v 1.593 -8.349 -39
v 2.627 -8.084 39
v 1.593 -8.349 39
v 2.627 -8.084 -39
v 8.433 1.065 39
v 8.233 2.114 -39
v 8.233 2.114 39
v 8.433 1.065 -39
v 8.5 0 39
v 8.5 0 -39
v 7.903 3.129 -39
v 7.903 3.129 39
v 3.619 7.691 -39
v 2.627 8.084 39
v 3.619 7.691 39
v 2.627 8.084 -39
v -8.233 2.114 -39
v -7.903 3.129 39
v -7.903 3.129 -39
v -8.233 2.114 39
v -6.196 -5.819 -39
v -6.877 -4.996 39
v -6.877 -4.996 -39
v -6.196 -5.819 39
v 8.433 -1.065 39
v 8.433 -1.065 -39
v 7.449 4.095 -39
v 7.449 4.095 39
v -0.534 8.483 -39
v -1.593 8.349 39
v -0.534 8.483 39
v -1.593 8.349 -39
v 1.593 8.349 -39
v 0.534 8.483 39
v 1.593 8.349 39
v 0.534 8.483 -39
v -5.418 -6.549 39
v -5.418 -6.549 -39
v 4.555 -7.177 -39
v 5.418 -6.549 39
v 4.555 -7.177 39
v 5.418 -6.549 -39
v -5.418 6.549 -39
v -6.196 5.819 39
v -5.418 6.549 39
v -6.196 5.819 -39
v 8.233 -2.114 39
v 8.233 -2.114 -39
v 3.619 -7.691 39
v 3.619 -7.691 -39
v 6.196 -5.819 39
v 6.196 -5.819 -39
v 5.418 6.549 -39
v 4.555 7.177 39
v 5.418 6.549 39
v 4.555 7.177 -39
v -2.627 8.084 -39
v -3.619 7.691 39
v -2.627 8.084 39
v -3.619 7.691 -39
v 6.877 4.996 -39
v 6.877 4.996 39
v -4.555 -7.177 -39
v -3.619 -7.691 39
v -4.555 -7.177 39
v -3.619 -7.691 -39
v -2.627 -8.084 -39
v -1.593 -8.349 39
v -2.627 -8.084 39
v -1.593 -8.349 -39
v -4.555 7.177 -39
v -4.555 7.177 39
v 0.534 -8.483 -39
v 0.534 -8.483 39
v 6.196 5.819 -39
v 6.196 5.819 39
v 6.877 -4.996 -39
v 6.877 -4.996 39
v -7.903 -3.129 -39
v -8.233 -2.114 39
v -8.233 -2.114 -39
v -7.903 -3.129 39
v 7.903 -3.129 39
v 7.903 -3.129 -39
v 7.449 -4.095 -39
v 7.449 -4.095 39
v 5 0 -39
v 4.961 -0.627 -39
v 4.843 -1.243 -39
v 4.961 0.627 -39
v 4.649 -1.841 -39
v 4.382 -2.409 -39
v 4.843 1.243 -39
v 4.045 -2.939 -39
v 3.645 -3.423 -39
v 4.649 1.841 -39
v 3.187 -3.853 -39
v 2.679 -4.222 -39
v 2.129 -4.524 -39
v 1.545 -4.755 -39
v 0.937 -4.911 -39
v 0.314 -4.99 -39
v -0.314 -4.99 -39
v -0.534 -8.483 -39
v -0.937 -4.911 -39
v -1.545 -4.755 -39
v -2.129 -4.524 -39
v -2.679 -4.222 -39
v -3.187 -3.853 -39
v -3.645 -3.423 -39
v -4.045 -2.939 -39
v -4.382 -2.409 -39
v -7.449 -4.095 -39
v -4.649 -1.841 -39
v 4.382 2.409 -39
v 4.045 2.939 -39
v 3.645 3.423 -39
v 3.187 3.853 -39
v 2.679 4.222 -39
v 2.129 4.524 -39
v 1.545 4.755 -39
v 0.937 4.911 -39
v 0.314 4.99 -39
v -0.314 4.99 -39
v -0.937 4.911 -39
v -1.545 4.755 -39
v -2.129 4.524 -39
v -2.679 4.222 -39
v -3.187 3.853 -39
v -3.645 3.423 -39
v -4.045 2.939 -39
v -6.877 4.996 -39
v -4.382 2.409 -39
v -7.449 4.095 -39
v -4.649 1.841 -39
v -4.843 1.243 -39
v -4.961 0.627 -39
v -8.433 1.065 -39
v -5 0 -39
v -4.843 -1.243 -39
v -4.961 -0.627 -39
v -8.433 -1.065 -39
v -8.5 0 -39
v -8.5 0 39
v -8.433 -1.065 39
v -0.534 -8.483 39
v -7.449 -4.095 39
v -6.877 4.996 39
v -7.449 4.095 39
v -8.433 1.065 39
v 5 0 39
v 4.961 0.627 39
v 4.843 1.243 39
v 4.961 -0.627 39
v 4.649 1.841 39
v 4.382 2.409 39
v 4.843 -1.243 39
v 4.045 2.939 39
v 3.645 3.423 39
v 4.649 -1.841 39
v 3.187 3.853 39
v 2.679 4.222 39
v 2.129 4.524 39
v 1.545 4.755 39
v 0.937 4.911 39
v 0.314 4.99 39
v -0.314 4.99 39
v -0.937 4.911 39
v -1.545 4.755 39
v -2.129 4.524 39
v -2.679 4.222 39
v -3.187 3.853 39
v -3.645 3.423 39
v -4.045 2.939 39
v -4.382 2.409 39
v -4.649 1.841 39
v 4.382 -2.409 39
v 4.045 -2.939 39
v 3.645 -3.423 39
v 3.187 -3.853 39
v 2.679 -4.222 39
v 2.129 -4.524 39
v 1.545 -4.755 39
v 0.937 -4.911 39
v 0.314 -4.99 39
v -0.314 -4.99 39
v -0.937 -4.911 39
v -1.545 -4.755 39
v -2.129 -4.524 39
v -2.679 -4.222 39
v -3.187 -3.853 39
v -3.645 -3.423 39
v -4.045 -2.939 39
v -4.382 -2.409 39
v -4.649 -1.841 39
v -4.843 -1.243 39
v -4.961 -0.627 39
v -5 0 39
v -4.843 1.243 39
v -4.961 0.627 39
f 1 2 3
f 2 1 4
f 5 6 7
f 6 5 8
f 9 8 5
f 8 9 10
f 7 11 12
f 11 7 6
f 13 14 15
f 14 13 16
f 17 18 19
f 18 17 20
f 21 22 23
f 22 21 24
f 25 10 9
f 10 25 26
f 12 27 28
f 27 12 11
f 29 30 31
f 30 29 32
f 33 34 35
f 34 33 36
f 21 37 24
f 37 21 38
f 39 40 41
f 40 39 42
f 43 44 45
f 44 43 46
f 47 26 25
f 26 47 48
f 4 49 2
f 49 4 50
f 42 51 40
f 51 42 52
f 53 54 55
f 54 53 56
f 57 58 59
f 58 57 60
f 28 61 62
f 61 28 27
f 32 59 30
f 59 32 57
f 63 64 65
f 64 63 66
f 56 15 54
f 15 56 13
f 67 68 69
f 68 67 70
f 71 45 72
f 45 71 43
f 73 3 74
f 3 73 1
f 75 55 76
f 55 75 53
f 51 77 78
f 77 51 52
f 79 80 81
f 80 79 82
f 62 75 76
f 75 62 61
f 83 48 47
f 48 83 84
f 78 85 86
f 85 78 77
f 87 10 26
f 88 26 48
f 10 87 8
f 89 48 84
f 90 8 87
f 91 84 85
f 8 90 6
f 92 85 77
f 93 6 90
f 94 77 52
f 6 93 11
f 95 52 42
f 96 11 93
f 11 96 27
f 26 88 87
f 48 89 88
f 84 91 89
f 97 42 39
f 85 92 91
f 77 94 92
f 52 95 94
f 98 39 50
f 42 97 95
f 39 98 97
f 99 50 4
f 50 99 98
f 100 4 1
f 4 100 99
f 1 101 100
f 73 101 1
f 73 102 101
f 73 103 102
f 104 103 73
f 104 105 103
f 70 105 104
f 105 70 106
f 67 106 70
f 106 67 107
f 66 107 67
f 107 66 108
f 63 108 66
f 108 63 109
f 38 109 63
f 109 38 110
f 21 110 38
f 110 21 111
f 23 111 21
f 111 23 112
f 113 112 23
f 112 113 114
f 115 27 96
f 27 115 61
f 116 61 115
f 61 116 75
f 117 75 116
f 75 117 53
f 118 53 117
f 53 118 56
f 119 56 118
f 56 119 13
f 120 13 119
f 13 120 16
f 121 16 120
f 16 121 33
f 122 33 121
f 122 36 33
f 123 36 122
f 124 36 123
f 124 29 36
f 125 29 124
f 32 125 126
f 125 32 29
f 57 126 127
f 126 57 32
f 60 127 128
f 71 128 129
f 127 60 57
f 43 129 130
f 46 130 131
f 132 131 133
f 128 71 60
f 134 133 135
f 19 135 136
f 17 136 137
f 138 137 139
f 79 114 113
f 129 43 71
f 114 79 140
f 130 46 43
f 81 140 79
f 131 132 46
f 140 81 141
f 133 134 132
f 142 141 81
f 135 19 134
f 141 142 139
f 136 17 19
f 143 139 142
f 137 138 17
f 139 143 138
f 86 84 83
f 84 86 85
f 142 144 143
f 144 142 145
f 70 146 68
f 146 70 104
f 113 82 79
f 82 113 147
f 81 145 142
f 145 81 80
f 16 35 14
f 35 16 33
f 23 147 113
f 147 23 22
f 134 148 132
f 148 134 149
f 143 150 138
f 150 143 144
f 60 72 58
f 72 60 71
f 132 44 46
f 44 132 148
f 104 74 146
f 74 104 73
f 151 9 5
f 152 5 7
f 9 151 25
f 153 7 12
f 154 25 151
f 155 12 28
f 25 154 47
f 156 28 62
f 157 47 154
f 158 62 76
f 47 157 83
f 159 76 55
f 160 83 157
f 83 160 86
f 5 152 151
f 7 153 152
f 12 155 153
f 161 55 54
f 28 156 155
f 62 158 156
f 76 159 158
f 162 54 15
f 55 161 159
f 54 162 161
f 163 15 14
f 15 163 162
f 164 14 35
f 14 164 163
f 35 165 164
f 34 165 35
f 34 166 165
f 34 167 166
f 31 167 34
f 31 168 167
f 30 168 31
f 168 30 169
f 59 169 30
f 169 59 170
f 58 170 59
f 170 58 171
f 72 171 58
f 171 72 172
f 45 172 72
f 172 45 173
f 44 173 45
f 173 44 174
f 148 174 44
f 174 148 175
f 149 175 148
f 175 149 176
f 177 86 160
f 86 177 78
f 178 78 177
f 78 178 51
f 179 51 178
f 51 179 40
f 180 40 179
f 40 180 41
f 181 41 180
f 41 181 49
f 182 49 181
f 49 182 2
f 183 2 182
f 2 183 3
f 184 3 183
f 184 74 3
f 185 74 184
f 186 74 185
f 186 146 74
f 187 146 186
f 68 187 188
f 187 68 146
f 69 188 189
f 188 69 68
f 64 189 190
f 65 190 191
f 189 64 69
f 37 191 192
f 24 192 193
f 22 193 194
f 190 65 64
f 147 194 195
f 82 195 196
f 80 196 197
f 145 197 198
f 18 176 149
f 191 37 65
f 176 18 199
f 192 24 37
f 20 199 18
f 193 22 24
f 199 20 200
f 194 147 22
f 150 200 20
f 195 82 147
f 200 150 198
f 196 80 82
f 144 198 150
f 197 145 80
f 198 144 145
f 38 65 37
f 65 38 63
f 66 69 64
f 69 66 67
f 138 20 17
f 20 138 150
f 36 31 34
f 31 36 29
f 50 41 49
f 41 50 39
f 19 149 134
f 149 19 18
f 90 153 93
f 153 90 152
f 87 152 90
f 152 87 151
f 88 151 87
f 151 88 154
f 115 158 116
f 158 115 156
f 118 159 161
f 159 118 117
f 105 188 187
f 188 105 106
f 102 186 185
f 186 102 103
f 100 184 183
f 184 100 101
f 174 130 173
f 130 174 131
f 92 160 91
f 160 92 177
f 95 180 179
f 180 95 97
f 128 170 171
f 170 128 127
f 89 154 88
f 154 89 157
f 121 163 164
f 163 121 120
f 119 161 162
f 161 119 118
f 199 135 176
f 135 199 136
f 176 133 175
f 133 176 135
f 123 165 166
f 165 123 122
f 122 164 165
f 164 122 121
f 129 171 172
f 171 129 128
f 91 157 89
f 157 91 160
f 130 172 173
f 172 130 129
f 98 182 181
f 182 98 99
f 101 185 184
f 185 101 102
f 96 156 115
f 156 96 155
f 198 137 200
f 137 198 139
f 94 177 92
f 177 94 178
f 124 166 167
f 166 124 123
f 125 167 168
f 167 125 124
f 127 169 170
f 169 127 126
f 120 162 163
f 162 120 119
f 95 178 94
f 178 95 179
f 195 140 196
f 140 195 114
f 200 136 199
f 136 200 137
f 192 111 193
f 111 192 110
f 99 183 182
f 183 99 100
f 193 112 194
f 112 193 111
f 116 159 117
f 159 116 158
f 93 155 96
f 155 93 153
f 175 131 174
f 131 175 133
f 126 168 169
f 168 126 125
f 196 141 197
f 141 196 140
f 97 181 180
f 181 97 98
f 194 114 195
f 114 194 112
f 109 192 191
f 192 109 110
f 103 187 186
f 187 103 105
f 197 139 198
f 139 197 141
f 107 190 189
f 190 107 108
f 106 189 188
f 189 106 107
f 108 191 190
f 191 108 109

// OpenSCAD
$fn = 50;


difference() {
	union() {
		translate(v = [0, 0, -39.0000000000]) {
			cylinder(h = 78, r = 8.5000000000);
		}
	}
	union() {
		translate(v = [0, 0, -100.0000000000]) {
			cylinder(h = 200, r = 5.0000000000);
		}
	}
}
